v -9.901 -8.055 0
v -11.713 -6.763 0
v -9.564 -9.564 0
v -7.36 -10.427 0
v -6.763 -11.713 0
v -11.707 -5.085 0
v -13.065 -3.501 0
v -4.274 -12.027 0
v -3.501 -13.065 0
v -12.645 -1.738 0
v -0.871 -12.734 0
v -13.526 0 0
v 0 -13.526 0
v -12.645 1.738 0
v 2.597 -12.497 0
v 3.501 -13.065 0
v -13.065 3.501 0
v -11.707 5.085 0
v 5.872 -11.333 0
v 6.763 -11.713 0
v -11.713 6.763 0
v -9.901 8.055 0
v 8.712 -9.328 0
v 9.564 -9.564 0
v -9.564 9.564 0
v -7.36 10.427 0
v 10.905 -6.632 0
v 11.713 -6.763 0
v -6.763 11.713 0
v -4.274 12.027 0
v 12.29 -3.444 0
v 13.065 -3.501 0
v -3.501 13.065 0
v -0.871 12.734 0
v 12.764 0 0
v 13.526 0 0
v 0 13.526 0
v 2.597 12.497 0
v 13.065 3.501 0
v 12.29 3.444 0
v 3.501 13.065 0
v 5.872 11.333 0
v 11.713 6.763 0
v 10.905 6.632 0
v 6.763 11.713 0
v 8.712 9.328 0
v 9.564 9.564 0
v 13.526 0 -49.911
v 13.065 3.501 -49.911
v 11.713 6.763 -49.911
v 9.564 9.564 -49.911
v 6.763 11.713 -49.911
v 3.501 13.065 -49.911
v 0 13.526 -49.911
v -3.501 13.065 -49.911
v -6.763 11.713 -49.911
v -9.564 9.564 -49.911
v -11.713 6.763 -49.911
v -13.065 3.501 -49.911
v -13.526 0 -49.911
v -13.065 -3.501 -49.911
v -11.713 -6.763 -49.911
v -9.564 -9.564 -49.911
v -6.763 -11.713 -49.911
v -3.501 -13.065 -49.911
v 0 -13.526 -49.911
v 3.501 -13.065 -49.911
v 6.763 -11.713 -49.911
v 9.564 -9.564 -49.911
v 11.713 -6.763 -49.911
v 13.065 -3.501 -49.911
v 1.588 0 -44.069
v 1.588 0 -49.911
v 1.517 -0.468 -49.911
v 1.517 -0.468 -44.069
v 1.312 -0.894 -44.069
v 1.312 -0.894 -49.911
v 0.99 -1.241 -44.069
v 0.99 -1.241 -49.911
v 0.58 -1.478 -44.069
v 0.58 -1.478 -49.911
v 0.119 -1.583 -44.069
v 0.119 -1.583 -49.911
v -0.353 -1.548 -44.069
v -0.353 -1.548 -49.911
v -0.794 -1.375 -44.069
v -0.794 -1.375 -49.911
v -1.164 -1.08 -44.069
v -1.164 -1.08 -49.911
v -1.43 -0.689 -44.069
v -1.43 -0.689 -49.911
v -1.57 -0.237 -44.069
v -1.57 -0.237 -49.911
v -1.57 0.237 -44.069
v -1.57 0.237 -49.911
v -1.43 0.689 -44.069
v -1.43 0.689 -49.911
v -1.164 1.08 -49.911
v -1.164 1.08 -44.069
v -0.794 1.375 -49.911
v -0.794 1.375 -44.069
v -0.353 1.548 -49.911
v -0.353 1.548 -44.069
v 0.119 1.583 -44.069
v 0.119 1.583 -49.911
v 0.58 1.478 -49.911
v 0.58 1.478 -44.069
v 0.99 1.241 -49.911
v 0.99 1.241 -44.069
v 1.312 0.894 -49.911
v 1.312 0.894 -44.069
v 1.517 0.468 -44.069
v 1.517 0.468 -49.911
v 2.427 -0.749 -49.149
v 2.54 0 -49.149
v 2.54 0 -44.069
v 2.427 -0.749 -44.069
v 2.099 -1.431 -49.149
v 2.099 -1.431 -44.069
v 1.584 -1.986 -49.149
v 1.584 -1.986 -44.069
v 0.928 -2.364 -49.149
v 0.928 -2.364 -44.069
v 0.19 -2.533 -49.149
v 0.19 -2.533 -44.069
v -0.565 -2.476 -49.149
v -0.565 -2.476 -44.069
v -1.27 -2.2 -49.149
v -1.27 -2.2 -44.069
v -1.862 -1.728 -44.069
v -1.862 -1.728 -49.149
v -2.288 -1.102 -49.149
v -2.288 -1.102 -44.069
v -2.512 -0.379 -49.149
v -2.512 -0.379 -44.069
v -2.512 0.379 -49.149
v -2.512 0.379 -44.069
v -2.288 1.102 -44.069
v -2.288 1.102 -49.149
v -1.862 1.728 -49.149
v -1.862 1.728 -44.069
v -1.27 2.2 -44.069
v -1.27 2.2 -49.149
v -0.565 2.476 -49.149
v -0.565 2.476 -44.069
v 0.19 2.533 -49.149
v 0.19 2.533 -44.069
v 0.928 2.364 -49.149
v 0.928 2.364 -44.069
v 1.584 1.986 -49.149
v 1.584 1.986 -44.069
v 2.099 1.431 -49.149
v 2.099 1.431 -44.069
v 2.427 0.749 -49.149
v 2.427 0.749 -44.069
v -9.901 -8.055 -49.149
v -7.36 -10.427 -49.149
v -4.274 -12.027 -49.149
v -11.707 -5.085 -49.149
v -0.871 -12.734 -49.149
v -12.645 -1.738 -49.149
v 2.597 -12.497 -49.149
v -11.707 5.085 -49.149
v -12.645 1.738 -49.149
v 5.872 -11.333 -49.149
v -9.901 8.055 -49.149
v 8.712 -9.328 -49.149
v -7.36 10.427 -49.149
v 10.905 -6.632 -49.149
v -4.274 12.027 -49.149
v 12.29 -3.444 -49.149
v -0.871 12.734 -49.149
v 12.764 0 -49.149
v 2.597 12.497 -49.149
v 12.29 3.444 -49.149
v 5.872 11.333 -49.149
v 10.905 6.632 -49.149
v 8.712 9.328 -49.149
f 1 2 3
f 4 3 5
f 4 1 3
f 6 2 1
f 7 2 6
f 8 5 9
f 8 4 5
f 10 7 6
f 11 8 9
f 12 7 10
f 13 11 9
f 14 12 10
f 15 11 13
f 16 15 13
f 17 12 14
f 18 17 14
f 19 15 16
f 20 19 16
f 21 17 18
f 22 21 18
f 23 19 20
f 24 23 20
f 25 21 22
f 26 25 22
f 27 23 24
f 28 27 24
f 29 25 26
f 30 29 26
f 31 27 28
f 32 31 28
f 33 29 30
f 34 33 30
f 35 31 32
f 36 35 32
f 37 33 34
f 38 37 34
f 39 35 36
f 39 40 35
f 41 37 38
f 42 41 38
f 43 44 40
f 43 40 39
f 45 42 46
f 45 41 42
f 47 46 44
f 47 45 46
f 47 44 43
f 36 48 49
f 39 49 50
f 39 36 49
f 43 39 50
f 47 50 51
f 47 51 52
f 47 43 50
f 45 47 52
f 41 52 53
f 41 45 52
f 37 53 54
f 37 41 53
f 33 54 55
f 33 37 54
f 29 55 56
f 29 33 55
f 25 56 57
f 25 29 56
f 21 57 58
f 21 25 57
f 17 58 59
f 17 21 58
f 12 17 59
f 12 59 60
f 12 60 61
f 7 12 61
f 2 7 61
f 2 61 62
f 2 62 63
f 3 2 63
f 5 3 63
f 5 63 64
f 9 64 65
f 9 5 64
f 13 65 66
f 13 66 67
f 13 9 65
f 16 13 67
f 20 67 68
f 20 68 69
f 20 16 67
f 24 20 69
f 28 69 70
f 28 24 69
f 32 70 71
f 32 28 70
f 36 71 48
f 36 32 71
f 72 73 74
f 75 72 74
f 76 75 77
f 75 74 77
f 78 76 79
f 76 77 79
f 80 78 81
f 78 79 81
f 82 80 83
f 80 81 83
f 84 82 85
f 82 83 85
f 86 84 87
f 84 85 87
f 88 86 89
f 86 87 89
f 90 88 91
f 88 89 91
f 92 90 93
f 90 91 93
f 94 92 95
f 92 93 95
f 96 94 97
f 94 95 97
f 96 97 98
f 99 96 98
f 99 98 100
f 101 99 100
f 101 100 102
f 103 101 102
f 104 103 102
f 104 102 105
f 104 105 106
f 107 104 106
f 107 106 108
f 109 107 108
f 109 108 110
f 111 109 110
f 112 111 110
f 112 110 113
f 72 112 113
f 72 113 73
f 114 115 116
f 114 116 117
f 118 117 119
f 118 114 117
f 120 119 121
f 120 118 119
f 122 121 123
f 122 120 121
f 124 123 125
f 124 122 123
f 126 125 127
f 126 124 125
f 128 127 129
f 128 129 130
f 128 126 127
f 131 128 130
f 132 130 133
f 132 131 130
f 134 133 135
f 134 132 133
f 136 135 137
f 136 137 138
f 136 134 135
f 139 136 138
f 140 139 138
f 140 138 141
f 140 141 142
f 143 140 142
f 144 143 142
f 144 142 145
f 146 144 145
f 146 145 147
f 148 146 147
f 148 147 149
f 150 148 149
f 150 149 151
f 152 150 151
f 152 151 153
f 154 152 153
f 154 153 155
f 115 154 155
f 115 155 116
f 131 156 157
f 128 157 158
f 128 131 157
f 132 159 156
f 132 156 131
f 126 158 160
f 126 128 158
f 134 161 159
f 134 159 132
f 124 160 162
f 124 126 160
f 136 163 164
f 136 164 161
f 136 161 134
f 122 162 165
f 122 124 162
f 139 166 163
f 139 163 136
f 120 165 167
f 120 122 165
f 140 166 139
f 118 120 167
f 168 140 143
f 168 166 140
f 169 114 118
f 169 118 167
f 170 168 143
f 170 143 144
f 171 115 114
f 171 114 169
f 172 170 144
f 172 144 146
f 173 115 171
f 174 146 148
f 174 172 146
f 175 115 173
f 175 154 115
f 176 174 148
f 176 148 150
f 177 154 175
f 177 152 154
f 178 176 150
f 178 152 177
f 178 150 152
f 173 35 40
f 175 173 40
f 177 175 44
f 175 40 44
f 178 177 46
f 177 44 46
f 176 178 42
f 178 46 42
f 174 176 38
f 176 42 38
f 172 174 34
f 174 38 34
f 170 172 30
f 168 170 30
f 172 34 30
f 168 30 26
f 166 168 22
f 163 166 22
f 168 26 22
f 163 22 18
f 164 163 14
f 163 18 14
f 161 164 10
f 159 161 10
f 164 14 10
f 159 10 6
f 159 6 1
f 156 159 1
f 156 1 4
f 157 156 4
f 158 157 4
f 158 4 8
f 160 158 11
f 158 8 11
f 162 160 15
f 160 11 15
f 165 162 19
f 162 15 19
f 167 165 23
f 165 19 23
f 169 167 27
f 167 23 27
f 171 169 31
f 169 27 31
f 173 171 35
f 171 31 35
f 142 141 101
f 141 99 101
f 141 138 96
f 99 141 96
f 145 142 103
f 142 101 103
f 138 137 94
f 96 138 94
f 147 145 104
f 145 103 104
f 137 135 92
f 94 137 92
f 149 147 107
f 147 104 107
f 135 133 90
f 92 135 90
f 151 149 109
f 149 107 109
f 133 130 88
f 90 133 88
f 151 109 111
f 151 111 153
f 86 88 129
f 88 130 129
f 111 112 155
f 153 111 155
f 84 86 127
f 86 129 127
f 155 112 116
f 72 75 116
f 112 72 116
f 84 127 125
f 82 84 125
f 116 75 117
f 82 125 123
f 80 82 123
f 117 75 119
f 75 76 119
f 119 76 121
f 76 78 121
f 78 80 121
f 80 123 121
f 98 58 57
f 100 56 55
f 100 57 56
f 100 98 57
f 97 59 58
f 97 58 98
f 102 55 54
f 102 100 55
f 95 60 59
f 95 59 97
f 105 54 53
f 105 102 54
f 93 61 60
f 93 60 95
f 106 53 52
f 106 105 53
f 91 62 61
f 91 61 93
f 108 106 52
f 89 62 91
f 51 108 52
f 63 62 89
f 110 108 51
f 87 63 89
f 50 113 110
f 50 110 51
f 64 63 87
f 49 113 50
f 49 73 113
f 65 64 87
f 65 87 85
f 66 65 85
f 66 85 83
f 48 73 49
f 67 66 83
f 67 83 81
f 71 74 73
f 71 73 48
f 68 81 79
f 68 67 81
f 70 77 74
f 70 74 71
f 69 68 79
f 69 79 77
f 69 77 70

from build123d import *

# Parameters (mm, degrees)
F0_R     = 13.5255
F1_DEPTH = 49.911
F2_R     = 12.7635
F3_DEPTH = 49.149
F4_R     = 2.54
F4_R_2   = 1.5875
F5_DEPTH = 5.842
F6_R     = 1.5875
F7_DEPTH = 49.912


with BuildPart() as f1:
    # F0 (on Top) → F1 (new body)
    with BuildSketch(Plane.XY):
        Circle(F0_R)
    extrude(amount=-F1_DEPTH)

    # F2 (on face) → F3 (cut)
    with BuildSketch(Plane.XY):
        Circle(F2_R)
    extrude(amount=-F3_DEPTH, mode=Mode.SUBTRACT)

    # F4 (on face) → F5 (join)
    with BuildSketch(Plane(origin=(0, 0, -49.911), x_dir=(1, 0, 0), z_dir=(0, 0, -1))):
        Circle(F4_R)
        Circle(F4_R_2, mode=Mode.SUBTRACT)
    extrude(amount=-F5_DEPTH)

    # F6 (on face) → F7 (cut, through all)
    with BuildSketch(Plane(origin=(0, 0, -49.911), x_dir=(1, 0, 0), z_dir=(0, 0, -1))):
        Circle(F6_R)
    extrude(amount=-F7_DEPTH, mode=Mode.SUBTRACT)


solid = f1.part
